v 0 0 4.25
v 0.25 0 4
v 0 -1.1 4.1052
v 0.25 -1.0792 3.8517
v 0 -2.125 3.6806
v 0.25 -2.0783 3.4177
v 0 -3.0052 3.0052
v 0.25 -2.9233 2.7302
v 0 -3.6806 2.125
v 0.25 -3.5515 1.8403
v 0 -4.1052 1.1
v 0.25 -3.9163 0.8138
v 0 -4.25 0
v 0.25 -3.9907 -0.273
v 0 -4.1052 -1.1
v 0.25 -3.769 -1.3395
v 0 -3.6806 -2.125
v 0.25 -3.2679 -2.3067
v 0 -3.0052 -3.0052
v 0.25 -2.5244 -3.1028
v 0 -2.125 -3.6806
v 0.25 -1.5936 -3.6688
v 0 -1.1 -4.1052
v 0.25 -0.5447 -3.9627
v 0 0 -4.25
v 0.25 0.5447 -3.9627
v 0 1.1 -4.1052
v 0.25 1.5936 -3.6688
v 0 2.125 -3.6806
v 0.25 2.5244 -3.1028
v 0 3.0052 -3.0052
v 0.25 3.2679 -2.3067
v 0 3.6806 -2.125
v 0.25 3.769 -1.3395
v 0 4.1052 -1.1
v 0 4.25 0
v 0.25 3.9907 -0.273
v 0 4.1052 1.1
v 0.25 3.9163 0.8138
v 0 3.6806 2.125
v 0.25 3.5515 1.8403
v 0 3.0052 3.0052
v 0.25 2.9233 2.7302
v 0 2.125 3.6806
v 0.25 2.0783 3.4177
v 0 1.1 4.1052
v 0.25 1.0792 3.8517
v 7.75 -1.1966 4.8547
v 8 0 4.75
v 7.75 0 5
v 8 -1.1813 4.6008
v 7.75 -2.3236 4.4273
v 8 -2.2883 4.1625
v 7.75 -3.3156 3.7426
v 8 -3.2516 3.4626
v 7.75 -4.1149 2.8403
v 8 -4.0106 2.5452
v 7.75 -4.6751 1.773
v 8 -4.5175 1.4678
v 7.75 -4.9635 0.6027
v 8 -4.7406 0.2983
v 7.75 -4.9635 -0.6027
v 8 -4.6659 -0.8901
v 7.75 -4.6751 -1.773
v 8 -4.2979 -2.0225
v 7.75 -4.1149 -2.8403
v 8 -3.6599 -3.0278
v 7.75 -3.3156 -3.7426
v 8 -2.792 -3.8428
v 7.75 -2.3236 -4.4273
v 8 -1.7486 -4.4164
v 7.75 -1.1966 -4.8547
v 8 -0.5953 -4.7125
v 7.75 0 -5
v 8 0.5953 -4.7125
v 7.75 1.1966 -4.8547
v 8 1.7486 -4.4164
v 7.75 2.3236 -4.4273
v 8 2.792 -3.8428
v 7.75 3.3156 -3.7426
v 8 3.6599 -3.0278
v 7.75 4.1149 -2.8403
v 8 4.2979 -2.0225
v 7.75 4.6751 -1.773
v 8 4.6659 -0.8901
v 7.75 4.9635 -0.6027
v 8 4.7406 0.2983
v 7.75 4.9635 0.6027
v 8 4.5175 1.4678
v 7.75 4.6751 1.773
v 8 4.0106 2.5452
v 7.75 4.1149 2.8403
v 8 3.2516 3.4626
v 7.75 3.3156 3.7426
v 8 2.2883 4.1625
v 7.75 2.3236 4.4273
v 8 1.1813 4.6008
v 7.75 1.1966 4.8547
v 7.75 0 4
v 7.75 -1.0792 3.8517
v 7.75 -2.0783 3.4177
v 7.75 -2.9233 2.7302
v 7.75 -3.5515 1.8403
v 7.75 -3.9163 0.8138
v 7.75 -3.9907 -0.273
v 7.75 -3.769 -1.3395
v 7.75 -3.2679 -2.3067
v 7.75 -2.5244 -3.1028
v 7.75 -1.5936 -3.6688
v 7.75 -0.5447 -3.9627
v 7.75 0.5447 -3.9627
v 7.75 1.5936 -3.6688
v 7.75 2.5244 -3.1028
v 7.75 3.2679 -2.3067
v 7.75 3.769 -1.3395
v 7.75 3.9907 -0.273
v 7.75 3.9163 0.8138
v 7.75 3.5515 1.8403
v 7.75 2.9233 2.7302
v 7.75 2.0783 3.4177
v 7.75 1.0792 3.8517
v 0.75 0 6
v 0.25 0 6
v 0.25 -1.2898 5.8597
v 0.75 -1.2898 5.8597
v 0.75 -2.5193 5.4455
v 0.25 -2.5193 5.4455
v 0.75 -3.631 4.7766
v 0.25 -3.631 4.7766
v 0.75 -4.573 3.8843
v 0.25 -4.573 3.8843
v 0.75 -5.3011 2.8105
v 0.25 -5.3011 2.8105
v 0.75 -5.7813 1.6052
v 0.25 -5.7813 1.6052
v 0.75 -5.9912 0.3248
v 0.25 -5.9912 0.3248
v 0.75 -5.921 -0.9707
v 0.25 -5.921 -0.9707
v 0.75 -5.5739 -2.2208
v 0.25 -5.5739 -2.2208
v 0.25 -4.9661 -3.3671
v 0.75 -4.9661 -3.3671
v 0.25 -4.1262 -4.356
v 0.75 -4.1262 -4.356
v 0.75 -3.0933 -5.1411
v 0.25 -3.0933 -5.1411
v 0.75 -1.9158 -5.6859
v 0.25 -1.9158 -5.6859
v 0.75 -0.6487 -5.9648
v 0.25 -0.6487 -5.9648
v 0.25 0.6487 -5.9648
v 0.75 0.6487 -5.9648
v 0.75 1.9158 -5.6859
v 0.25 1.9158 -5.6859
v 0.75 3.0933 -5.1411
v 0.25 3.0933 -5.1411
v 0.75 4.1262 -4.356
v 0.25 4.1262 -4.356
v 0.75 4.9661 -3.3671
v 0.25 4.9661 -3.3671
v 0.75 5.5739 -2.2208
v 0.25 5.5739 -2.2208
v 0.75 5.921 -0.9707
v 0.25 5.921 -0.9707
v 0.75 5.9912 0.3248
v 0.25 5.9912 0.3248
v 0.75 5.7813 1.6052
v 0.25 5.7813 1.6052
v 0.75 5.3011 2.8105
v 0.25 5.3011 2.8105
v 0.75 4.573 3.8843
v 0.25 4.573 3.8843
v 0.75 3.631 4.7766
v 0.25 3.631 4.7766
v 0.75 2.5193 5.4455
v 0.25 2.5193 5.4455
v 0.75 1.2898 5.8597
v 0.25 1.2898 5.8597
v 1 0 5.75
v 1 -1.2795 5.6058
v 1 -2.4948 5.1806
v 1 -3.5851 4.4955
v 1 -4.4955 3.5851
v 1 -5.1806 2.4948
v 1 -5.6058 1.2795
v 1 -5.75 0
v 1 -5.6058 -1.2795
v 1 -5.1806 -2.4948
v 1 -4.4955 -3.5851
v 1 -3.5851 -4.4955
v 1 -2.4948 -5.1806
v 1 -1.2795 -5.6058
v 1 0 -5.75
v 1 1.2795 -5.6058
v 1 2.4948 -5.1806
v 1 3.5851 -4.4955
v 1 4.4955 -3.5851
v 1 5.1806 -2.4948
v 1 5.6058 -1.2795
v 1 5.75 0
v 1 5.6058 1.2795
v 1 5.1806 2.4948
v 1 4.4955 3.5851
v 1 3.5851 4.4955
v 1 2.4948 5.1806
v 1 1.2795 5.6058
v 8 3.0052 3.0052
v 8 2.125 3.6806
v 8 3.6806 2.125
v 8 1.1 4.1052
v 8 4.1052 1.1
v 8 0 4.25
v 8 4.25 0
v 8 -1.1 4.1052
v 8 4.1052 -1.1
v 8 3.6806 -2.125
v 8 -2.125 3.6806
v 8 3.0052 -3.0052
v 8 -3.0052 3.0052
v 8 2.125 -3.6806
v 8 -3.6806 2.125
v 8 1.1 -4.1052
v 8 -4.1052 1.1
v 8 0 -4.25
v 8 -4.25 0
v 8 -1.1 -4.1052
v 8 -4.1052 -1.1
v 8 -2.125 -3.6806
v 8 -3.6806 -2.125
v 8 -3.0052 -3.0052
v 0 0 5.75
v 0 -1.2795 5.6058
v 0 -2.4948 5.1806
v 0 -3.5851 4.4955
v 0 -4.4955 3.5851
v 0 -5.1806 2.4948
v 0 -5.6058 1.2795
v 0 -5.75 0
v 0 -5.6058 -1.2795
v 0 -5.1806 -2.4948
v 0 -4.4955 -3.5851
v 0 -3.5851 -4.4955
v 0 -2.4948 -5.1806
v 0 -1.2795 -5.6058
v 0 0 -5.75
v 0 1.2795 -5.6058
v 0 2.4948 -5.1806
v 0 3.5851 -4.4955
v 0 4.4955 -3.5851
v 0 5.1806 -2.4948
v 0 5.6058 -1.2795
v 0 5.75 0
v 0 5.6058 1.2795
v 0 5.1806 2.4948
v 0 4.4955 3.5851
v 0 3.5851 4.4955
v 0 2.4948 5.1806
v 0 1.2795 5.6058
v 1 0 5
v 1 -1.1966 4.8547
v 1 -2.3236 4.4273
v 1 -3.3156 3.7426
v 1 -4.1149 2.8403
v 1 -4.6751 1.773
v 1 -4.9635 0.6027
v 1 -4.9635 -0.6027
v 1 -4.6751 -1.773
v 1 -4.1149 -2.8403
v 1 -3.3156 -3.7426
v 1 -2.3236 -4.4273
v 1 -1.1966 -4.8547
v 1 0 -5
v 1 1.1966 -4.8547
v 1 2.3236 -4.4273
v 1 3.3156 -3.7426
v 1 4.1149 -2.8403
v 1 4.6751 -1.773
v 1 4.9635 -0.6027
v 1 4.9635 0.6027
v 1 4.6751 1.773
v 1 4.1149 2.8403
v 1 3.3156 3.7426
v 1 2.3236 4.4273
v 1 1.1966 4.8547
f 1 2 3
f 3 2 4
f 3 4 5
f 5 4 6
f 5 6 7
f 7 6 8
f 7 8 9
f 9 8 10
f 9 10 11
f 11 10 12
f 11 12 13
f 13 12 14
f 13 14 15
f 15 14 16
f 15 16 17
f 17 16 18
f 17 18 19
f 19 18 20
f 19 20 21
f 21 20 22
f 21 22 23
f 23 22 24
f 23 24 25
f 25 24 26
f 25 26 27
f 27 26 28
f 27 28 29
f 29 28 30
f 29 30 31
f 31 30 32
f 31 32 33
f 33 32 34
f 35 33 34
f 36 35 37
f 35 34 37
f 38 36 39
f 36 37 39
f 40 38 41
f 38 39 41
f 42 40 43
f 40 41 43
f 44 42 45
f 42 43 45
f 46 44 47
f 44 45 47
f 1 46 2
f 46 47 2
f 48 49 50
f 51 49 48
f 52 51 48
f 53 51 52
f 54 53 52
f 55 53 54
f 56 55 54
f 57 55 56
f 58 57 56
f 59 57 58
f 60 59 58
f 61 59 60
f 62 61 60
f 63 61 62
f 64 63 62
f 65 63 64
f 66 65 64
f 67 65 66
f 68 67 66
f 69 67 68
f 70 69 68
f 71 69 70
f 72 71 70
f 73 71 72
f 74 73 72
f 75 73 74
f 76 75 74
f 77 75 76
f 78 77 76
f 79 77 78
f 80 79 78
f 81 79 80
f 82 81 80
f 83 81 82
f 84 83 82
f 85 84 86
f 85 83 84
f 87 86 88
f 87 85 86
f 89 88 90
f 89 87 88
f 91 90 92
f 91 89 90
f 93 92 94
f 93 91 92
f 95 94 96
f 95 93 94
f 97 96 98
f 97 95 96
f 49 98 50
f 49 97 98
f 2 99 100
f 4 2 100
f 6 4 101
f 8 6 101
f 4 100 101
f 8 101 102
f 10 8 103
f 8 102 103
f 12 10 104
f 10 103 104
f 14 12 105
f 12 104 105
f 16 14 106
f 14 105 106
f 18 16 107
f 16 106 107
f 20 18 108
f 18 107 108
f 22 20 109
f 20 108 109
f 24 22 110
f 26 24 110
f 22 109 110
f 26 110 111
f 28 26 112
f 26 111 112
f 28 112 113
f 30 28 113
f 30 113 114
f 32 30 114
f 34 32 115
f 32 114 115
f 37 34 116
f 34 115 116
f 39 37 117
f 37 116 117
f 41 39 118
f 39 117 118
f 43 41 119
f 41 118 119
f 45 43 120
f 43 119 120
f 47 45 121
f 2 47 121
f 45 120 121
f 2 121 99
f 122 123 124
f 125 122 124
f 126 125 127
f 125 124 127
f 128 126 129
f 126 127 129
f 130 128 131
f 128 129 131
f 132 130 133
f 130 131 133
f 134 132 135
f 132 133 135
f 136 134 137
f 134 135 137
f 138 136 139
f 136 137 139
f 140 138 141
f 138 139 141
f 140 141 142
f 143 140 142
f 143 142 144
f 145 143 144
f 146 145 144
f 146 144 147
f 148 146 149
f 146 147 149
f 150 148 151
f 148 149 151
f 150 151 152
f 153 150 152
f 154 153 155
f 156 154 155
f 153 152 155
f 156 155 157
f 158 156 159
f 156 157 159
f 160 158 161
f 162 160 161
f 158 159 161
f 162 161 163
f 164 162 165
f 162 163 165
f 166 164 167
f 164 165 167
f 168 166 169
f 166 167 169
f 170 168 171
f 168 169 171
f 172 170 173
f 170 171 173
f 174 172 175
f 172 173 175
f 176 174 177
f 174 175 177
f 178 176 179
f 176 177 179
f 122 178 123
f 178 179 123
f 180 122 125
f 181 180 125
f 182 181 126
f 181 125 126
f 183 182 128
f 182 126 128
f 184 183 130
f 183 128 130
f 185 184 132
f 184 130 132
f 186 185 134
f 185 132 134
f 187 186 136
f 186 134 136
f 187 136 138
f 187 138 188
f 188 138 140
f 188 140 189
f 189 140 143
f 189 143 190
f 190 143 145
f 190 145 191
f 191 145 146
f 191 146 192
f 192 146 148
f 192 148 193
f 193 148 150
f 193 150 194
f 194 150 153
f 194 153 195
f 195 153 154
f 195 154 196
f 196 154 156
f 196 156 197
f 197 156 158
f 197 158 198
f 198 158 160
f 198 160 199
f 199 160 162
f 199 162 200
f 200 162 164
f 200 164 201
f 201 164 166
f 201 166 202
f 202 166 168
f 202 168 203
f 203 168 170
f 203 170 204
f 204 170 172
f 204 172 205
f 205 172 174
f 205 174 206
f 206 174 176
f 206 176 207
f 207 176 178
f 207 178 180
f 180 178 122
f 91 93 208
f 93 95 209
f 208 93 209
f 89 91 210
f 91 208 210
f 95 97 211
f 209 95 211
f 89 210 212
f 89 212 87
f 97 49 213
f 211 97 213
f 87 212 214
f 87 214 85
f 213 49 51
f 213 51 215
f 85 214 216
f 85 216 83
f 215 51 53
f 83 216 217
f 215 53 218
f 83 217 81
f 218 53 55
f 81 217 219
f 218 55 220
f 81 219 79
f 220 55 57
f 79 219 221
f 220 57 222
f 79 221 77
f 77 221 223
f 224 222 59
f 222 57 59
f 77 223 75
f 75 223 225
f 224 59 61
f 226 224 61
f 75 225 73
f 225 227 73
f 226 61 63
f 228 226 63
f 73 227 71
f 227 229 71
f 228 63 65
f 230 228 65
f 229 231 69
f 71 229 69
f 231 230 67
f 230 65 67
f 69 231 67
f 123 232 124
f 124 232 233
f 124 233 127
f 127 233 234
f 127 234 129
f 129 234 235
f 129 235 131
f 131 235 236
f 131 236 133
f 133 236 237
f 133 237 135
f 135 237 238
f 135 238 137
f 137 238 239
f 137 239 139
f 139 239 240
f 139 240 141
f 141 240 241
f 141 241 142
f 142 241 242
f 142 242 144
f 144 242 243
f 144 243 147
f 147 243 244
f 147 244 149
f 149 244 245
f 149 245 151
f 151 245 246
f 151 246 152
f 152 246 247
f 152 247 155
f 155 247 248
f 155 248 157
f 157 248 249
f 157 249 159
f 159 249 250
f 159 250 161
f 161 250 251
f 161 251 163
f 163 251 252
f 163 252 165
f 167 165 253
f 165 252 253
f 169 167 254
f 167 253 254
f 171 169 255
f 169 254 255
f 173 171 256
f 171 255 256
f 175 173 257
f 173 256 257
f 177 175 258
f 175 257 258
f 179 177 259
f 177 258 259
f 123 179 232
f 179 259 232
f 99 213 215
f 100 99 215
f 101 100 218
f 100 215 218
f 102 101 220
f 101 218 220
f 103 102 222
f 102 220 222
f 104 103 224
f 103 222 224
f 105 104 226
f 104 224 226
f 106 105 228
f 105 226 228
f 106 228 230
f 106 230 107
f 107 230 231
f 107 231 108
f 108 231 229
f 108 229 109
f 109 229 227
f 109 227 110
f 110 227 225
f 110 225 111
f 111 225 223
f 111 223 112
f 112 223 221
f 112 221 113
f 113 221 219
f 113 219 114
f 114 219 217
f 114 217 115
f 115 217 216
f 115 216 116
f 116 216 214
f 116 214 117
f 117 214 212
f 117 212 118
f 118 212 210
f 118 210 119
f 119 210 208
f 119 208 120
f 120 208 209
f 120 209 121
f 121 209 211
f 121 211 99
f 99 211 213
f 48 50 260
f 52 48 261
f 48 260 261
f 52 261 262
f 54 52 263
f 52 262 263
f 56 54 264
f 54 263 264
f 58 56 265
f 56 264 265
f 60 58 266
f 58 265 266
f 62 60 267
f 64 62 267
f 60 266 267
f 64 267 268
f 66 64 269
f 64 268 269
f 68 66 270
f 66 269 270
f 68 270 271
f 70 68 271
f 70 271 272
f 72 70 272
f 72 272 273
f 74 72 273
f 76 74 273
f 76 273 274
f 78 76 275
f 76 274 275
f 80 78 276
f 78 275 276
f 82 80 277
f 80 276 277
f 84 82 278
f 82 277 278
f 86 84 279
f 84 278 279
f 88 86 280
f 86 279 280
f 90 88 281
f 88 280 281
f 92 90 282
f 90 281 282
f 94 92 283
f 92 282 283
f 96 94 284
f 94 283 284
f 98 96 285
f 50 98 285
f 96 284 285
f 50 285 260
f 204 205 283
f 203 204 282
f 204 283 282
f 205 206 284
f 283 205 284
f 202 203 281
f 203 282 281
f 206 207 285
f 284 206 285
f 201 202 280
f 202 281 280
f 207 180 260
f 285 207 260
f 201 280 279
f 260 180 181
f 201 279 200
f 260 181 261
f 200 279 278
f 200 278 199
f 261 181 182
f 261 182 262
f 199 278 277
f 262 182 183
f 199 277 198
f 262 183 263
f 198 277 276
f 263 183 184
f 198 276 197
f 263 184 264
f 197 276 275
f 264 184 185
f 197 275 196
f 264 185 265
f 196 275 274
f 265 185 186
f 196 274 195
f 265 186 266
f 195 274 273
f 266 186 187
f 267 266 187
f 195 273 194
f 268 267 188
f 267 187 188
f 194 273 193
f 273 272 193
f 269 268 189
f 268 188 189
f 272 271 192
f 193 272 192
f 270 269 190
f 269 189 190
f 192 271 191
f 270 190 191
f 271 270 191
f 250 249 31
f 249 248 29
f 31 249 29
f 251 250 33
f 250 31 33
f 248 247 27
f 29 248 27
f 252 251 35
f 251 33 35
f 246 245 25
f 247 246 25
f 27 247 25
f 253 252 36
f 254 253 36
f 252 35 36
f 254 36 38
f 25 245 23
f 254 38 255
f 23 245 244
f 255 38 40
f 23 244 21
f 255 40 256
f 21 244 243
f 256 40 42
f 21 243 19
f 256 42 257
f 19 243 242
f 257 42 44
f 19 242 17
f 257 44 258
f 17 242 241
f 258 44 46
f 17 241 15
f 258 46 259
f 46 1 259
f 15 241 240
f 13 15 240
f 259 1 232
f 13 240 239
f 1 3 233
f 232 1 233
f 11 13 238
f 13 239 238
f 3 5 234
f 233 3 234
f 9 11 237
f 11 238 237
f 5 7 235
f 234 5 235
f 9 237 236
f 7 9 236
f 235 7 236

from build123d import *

# Parameters (mm, degrees)
CHANFREIN1_SIZE = 0.25


with BuildPart() as part:
    # Esquisse1 → Révolution1 (revolve)
    with BuildSketch(Plane(origin=(0, 0, 0), x_dir=(1, 0, 0), z_dir=(0, 1, 0)), mode=Mode.PRIVATE) as r_volution1_sk:
        Polygon((8, 5), (1, 5), (1, 6), (0, 6), (0, 4), (8, 4), align=None)
    revolve(r_volution1_sk.sketch.rotate(Axis((-2.315789474, 0, 0), (1, 0, 0)), 180), axis=Axis((-2.315789474, 0, 0), (1, 0, 0)))

    # Chanfrein1
    chanfrein1_edges = [part.edges().sort_by_distance(p)[0] for p in [
        (8, 0, -4),
        (0, 0, -4),
        (0, 0, -6),
        (1, 0, -6),
        (8, 0, -5),
    ]]
    chamfer(chanfrein1_edges, length=CHANFREIN1_SIZE)


solid = part.part
